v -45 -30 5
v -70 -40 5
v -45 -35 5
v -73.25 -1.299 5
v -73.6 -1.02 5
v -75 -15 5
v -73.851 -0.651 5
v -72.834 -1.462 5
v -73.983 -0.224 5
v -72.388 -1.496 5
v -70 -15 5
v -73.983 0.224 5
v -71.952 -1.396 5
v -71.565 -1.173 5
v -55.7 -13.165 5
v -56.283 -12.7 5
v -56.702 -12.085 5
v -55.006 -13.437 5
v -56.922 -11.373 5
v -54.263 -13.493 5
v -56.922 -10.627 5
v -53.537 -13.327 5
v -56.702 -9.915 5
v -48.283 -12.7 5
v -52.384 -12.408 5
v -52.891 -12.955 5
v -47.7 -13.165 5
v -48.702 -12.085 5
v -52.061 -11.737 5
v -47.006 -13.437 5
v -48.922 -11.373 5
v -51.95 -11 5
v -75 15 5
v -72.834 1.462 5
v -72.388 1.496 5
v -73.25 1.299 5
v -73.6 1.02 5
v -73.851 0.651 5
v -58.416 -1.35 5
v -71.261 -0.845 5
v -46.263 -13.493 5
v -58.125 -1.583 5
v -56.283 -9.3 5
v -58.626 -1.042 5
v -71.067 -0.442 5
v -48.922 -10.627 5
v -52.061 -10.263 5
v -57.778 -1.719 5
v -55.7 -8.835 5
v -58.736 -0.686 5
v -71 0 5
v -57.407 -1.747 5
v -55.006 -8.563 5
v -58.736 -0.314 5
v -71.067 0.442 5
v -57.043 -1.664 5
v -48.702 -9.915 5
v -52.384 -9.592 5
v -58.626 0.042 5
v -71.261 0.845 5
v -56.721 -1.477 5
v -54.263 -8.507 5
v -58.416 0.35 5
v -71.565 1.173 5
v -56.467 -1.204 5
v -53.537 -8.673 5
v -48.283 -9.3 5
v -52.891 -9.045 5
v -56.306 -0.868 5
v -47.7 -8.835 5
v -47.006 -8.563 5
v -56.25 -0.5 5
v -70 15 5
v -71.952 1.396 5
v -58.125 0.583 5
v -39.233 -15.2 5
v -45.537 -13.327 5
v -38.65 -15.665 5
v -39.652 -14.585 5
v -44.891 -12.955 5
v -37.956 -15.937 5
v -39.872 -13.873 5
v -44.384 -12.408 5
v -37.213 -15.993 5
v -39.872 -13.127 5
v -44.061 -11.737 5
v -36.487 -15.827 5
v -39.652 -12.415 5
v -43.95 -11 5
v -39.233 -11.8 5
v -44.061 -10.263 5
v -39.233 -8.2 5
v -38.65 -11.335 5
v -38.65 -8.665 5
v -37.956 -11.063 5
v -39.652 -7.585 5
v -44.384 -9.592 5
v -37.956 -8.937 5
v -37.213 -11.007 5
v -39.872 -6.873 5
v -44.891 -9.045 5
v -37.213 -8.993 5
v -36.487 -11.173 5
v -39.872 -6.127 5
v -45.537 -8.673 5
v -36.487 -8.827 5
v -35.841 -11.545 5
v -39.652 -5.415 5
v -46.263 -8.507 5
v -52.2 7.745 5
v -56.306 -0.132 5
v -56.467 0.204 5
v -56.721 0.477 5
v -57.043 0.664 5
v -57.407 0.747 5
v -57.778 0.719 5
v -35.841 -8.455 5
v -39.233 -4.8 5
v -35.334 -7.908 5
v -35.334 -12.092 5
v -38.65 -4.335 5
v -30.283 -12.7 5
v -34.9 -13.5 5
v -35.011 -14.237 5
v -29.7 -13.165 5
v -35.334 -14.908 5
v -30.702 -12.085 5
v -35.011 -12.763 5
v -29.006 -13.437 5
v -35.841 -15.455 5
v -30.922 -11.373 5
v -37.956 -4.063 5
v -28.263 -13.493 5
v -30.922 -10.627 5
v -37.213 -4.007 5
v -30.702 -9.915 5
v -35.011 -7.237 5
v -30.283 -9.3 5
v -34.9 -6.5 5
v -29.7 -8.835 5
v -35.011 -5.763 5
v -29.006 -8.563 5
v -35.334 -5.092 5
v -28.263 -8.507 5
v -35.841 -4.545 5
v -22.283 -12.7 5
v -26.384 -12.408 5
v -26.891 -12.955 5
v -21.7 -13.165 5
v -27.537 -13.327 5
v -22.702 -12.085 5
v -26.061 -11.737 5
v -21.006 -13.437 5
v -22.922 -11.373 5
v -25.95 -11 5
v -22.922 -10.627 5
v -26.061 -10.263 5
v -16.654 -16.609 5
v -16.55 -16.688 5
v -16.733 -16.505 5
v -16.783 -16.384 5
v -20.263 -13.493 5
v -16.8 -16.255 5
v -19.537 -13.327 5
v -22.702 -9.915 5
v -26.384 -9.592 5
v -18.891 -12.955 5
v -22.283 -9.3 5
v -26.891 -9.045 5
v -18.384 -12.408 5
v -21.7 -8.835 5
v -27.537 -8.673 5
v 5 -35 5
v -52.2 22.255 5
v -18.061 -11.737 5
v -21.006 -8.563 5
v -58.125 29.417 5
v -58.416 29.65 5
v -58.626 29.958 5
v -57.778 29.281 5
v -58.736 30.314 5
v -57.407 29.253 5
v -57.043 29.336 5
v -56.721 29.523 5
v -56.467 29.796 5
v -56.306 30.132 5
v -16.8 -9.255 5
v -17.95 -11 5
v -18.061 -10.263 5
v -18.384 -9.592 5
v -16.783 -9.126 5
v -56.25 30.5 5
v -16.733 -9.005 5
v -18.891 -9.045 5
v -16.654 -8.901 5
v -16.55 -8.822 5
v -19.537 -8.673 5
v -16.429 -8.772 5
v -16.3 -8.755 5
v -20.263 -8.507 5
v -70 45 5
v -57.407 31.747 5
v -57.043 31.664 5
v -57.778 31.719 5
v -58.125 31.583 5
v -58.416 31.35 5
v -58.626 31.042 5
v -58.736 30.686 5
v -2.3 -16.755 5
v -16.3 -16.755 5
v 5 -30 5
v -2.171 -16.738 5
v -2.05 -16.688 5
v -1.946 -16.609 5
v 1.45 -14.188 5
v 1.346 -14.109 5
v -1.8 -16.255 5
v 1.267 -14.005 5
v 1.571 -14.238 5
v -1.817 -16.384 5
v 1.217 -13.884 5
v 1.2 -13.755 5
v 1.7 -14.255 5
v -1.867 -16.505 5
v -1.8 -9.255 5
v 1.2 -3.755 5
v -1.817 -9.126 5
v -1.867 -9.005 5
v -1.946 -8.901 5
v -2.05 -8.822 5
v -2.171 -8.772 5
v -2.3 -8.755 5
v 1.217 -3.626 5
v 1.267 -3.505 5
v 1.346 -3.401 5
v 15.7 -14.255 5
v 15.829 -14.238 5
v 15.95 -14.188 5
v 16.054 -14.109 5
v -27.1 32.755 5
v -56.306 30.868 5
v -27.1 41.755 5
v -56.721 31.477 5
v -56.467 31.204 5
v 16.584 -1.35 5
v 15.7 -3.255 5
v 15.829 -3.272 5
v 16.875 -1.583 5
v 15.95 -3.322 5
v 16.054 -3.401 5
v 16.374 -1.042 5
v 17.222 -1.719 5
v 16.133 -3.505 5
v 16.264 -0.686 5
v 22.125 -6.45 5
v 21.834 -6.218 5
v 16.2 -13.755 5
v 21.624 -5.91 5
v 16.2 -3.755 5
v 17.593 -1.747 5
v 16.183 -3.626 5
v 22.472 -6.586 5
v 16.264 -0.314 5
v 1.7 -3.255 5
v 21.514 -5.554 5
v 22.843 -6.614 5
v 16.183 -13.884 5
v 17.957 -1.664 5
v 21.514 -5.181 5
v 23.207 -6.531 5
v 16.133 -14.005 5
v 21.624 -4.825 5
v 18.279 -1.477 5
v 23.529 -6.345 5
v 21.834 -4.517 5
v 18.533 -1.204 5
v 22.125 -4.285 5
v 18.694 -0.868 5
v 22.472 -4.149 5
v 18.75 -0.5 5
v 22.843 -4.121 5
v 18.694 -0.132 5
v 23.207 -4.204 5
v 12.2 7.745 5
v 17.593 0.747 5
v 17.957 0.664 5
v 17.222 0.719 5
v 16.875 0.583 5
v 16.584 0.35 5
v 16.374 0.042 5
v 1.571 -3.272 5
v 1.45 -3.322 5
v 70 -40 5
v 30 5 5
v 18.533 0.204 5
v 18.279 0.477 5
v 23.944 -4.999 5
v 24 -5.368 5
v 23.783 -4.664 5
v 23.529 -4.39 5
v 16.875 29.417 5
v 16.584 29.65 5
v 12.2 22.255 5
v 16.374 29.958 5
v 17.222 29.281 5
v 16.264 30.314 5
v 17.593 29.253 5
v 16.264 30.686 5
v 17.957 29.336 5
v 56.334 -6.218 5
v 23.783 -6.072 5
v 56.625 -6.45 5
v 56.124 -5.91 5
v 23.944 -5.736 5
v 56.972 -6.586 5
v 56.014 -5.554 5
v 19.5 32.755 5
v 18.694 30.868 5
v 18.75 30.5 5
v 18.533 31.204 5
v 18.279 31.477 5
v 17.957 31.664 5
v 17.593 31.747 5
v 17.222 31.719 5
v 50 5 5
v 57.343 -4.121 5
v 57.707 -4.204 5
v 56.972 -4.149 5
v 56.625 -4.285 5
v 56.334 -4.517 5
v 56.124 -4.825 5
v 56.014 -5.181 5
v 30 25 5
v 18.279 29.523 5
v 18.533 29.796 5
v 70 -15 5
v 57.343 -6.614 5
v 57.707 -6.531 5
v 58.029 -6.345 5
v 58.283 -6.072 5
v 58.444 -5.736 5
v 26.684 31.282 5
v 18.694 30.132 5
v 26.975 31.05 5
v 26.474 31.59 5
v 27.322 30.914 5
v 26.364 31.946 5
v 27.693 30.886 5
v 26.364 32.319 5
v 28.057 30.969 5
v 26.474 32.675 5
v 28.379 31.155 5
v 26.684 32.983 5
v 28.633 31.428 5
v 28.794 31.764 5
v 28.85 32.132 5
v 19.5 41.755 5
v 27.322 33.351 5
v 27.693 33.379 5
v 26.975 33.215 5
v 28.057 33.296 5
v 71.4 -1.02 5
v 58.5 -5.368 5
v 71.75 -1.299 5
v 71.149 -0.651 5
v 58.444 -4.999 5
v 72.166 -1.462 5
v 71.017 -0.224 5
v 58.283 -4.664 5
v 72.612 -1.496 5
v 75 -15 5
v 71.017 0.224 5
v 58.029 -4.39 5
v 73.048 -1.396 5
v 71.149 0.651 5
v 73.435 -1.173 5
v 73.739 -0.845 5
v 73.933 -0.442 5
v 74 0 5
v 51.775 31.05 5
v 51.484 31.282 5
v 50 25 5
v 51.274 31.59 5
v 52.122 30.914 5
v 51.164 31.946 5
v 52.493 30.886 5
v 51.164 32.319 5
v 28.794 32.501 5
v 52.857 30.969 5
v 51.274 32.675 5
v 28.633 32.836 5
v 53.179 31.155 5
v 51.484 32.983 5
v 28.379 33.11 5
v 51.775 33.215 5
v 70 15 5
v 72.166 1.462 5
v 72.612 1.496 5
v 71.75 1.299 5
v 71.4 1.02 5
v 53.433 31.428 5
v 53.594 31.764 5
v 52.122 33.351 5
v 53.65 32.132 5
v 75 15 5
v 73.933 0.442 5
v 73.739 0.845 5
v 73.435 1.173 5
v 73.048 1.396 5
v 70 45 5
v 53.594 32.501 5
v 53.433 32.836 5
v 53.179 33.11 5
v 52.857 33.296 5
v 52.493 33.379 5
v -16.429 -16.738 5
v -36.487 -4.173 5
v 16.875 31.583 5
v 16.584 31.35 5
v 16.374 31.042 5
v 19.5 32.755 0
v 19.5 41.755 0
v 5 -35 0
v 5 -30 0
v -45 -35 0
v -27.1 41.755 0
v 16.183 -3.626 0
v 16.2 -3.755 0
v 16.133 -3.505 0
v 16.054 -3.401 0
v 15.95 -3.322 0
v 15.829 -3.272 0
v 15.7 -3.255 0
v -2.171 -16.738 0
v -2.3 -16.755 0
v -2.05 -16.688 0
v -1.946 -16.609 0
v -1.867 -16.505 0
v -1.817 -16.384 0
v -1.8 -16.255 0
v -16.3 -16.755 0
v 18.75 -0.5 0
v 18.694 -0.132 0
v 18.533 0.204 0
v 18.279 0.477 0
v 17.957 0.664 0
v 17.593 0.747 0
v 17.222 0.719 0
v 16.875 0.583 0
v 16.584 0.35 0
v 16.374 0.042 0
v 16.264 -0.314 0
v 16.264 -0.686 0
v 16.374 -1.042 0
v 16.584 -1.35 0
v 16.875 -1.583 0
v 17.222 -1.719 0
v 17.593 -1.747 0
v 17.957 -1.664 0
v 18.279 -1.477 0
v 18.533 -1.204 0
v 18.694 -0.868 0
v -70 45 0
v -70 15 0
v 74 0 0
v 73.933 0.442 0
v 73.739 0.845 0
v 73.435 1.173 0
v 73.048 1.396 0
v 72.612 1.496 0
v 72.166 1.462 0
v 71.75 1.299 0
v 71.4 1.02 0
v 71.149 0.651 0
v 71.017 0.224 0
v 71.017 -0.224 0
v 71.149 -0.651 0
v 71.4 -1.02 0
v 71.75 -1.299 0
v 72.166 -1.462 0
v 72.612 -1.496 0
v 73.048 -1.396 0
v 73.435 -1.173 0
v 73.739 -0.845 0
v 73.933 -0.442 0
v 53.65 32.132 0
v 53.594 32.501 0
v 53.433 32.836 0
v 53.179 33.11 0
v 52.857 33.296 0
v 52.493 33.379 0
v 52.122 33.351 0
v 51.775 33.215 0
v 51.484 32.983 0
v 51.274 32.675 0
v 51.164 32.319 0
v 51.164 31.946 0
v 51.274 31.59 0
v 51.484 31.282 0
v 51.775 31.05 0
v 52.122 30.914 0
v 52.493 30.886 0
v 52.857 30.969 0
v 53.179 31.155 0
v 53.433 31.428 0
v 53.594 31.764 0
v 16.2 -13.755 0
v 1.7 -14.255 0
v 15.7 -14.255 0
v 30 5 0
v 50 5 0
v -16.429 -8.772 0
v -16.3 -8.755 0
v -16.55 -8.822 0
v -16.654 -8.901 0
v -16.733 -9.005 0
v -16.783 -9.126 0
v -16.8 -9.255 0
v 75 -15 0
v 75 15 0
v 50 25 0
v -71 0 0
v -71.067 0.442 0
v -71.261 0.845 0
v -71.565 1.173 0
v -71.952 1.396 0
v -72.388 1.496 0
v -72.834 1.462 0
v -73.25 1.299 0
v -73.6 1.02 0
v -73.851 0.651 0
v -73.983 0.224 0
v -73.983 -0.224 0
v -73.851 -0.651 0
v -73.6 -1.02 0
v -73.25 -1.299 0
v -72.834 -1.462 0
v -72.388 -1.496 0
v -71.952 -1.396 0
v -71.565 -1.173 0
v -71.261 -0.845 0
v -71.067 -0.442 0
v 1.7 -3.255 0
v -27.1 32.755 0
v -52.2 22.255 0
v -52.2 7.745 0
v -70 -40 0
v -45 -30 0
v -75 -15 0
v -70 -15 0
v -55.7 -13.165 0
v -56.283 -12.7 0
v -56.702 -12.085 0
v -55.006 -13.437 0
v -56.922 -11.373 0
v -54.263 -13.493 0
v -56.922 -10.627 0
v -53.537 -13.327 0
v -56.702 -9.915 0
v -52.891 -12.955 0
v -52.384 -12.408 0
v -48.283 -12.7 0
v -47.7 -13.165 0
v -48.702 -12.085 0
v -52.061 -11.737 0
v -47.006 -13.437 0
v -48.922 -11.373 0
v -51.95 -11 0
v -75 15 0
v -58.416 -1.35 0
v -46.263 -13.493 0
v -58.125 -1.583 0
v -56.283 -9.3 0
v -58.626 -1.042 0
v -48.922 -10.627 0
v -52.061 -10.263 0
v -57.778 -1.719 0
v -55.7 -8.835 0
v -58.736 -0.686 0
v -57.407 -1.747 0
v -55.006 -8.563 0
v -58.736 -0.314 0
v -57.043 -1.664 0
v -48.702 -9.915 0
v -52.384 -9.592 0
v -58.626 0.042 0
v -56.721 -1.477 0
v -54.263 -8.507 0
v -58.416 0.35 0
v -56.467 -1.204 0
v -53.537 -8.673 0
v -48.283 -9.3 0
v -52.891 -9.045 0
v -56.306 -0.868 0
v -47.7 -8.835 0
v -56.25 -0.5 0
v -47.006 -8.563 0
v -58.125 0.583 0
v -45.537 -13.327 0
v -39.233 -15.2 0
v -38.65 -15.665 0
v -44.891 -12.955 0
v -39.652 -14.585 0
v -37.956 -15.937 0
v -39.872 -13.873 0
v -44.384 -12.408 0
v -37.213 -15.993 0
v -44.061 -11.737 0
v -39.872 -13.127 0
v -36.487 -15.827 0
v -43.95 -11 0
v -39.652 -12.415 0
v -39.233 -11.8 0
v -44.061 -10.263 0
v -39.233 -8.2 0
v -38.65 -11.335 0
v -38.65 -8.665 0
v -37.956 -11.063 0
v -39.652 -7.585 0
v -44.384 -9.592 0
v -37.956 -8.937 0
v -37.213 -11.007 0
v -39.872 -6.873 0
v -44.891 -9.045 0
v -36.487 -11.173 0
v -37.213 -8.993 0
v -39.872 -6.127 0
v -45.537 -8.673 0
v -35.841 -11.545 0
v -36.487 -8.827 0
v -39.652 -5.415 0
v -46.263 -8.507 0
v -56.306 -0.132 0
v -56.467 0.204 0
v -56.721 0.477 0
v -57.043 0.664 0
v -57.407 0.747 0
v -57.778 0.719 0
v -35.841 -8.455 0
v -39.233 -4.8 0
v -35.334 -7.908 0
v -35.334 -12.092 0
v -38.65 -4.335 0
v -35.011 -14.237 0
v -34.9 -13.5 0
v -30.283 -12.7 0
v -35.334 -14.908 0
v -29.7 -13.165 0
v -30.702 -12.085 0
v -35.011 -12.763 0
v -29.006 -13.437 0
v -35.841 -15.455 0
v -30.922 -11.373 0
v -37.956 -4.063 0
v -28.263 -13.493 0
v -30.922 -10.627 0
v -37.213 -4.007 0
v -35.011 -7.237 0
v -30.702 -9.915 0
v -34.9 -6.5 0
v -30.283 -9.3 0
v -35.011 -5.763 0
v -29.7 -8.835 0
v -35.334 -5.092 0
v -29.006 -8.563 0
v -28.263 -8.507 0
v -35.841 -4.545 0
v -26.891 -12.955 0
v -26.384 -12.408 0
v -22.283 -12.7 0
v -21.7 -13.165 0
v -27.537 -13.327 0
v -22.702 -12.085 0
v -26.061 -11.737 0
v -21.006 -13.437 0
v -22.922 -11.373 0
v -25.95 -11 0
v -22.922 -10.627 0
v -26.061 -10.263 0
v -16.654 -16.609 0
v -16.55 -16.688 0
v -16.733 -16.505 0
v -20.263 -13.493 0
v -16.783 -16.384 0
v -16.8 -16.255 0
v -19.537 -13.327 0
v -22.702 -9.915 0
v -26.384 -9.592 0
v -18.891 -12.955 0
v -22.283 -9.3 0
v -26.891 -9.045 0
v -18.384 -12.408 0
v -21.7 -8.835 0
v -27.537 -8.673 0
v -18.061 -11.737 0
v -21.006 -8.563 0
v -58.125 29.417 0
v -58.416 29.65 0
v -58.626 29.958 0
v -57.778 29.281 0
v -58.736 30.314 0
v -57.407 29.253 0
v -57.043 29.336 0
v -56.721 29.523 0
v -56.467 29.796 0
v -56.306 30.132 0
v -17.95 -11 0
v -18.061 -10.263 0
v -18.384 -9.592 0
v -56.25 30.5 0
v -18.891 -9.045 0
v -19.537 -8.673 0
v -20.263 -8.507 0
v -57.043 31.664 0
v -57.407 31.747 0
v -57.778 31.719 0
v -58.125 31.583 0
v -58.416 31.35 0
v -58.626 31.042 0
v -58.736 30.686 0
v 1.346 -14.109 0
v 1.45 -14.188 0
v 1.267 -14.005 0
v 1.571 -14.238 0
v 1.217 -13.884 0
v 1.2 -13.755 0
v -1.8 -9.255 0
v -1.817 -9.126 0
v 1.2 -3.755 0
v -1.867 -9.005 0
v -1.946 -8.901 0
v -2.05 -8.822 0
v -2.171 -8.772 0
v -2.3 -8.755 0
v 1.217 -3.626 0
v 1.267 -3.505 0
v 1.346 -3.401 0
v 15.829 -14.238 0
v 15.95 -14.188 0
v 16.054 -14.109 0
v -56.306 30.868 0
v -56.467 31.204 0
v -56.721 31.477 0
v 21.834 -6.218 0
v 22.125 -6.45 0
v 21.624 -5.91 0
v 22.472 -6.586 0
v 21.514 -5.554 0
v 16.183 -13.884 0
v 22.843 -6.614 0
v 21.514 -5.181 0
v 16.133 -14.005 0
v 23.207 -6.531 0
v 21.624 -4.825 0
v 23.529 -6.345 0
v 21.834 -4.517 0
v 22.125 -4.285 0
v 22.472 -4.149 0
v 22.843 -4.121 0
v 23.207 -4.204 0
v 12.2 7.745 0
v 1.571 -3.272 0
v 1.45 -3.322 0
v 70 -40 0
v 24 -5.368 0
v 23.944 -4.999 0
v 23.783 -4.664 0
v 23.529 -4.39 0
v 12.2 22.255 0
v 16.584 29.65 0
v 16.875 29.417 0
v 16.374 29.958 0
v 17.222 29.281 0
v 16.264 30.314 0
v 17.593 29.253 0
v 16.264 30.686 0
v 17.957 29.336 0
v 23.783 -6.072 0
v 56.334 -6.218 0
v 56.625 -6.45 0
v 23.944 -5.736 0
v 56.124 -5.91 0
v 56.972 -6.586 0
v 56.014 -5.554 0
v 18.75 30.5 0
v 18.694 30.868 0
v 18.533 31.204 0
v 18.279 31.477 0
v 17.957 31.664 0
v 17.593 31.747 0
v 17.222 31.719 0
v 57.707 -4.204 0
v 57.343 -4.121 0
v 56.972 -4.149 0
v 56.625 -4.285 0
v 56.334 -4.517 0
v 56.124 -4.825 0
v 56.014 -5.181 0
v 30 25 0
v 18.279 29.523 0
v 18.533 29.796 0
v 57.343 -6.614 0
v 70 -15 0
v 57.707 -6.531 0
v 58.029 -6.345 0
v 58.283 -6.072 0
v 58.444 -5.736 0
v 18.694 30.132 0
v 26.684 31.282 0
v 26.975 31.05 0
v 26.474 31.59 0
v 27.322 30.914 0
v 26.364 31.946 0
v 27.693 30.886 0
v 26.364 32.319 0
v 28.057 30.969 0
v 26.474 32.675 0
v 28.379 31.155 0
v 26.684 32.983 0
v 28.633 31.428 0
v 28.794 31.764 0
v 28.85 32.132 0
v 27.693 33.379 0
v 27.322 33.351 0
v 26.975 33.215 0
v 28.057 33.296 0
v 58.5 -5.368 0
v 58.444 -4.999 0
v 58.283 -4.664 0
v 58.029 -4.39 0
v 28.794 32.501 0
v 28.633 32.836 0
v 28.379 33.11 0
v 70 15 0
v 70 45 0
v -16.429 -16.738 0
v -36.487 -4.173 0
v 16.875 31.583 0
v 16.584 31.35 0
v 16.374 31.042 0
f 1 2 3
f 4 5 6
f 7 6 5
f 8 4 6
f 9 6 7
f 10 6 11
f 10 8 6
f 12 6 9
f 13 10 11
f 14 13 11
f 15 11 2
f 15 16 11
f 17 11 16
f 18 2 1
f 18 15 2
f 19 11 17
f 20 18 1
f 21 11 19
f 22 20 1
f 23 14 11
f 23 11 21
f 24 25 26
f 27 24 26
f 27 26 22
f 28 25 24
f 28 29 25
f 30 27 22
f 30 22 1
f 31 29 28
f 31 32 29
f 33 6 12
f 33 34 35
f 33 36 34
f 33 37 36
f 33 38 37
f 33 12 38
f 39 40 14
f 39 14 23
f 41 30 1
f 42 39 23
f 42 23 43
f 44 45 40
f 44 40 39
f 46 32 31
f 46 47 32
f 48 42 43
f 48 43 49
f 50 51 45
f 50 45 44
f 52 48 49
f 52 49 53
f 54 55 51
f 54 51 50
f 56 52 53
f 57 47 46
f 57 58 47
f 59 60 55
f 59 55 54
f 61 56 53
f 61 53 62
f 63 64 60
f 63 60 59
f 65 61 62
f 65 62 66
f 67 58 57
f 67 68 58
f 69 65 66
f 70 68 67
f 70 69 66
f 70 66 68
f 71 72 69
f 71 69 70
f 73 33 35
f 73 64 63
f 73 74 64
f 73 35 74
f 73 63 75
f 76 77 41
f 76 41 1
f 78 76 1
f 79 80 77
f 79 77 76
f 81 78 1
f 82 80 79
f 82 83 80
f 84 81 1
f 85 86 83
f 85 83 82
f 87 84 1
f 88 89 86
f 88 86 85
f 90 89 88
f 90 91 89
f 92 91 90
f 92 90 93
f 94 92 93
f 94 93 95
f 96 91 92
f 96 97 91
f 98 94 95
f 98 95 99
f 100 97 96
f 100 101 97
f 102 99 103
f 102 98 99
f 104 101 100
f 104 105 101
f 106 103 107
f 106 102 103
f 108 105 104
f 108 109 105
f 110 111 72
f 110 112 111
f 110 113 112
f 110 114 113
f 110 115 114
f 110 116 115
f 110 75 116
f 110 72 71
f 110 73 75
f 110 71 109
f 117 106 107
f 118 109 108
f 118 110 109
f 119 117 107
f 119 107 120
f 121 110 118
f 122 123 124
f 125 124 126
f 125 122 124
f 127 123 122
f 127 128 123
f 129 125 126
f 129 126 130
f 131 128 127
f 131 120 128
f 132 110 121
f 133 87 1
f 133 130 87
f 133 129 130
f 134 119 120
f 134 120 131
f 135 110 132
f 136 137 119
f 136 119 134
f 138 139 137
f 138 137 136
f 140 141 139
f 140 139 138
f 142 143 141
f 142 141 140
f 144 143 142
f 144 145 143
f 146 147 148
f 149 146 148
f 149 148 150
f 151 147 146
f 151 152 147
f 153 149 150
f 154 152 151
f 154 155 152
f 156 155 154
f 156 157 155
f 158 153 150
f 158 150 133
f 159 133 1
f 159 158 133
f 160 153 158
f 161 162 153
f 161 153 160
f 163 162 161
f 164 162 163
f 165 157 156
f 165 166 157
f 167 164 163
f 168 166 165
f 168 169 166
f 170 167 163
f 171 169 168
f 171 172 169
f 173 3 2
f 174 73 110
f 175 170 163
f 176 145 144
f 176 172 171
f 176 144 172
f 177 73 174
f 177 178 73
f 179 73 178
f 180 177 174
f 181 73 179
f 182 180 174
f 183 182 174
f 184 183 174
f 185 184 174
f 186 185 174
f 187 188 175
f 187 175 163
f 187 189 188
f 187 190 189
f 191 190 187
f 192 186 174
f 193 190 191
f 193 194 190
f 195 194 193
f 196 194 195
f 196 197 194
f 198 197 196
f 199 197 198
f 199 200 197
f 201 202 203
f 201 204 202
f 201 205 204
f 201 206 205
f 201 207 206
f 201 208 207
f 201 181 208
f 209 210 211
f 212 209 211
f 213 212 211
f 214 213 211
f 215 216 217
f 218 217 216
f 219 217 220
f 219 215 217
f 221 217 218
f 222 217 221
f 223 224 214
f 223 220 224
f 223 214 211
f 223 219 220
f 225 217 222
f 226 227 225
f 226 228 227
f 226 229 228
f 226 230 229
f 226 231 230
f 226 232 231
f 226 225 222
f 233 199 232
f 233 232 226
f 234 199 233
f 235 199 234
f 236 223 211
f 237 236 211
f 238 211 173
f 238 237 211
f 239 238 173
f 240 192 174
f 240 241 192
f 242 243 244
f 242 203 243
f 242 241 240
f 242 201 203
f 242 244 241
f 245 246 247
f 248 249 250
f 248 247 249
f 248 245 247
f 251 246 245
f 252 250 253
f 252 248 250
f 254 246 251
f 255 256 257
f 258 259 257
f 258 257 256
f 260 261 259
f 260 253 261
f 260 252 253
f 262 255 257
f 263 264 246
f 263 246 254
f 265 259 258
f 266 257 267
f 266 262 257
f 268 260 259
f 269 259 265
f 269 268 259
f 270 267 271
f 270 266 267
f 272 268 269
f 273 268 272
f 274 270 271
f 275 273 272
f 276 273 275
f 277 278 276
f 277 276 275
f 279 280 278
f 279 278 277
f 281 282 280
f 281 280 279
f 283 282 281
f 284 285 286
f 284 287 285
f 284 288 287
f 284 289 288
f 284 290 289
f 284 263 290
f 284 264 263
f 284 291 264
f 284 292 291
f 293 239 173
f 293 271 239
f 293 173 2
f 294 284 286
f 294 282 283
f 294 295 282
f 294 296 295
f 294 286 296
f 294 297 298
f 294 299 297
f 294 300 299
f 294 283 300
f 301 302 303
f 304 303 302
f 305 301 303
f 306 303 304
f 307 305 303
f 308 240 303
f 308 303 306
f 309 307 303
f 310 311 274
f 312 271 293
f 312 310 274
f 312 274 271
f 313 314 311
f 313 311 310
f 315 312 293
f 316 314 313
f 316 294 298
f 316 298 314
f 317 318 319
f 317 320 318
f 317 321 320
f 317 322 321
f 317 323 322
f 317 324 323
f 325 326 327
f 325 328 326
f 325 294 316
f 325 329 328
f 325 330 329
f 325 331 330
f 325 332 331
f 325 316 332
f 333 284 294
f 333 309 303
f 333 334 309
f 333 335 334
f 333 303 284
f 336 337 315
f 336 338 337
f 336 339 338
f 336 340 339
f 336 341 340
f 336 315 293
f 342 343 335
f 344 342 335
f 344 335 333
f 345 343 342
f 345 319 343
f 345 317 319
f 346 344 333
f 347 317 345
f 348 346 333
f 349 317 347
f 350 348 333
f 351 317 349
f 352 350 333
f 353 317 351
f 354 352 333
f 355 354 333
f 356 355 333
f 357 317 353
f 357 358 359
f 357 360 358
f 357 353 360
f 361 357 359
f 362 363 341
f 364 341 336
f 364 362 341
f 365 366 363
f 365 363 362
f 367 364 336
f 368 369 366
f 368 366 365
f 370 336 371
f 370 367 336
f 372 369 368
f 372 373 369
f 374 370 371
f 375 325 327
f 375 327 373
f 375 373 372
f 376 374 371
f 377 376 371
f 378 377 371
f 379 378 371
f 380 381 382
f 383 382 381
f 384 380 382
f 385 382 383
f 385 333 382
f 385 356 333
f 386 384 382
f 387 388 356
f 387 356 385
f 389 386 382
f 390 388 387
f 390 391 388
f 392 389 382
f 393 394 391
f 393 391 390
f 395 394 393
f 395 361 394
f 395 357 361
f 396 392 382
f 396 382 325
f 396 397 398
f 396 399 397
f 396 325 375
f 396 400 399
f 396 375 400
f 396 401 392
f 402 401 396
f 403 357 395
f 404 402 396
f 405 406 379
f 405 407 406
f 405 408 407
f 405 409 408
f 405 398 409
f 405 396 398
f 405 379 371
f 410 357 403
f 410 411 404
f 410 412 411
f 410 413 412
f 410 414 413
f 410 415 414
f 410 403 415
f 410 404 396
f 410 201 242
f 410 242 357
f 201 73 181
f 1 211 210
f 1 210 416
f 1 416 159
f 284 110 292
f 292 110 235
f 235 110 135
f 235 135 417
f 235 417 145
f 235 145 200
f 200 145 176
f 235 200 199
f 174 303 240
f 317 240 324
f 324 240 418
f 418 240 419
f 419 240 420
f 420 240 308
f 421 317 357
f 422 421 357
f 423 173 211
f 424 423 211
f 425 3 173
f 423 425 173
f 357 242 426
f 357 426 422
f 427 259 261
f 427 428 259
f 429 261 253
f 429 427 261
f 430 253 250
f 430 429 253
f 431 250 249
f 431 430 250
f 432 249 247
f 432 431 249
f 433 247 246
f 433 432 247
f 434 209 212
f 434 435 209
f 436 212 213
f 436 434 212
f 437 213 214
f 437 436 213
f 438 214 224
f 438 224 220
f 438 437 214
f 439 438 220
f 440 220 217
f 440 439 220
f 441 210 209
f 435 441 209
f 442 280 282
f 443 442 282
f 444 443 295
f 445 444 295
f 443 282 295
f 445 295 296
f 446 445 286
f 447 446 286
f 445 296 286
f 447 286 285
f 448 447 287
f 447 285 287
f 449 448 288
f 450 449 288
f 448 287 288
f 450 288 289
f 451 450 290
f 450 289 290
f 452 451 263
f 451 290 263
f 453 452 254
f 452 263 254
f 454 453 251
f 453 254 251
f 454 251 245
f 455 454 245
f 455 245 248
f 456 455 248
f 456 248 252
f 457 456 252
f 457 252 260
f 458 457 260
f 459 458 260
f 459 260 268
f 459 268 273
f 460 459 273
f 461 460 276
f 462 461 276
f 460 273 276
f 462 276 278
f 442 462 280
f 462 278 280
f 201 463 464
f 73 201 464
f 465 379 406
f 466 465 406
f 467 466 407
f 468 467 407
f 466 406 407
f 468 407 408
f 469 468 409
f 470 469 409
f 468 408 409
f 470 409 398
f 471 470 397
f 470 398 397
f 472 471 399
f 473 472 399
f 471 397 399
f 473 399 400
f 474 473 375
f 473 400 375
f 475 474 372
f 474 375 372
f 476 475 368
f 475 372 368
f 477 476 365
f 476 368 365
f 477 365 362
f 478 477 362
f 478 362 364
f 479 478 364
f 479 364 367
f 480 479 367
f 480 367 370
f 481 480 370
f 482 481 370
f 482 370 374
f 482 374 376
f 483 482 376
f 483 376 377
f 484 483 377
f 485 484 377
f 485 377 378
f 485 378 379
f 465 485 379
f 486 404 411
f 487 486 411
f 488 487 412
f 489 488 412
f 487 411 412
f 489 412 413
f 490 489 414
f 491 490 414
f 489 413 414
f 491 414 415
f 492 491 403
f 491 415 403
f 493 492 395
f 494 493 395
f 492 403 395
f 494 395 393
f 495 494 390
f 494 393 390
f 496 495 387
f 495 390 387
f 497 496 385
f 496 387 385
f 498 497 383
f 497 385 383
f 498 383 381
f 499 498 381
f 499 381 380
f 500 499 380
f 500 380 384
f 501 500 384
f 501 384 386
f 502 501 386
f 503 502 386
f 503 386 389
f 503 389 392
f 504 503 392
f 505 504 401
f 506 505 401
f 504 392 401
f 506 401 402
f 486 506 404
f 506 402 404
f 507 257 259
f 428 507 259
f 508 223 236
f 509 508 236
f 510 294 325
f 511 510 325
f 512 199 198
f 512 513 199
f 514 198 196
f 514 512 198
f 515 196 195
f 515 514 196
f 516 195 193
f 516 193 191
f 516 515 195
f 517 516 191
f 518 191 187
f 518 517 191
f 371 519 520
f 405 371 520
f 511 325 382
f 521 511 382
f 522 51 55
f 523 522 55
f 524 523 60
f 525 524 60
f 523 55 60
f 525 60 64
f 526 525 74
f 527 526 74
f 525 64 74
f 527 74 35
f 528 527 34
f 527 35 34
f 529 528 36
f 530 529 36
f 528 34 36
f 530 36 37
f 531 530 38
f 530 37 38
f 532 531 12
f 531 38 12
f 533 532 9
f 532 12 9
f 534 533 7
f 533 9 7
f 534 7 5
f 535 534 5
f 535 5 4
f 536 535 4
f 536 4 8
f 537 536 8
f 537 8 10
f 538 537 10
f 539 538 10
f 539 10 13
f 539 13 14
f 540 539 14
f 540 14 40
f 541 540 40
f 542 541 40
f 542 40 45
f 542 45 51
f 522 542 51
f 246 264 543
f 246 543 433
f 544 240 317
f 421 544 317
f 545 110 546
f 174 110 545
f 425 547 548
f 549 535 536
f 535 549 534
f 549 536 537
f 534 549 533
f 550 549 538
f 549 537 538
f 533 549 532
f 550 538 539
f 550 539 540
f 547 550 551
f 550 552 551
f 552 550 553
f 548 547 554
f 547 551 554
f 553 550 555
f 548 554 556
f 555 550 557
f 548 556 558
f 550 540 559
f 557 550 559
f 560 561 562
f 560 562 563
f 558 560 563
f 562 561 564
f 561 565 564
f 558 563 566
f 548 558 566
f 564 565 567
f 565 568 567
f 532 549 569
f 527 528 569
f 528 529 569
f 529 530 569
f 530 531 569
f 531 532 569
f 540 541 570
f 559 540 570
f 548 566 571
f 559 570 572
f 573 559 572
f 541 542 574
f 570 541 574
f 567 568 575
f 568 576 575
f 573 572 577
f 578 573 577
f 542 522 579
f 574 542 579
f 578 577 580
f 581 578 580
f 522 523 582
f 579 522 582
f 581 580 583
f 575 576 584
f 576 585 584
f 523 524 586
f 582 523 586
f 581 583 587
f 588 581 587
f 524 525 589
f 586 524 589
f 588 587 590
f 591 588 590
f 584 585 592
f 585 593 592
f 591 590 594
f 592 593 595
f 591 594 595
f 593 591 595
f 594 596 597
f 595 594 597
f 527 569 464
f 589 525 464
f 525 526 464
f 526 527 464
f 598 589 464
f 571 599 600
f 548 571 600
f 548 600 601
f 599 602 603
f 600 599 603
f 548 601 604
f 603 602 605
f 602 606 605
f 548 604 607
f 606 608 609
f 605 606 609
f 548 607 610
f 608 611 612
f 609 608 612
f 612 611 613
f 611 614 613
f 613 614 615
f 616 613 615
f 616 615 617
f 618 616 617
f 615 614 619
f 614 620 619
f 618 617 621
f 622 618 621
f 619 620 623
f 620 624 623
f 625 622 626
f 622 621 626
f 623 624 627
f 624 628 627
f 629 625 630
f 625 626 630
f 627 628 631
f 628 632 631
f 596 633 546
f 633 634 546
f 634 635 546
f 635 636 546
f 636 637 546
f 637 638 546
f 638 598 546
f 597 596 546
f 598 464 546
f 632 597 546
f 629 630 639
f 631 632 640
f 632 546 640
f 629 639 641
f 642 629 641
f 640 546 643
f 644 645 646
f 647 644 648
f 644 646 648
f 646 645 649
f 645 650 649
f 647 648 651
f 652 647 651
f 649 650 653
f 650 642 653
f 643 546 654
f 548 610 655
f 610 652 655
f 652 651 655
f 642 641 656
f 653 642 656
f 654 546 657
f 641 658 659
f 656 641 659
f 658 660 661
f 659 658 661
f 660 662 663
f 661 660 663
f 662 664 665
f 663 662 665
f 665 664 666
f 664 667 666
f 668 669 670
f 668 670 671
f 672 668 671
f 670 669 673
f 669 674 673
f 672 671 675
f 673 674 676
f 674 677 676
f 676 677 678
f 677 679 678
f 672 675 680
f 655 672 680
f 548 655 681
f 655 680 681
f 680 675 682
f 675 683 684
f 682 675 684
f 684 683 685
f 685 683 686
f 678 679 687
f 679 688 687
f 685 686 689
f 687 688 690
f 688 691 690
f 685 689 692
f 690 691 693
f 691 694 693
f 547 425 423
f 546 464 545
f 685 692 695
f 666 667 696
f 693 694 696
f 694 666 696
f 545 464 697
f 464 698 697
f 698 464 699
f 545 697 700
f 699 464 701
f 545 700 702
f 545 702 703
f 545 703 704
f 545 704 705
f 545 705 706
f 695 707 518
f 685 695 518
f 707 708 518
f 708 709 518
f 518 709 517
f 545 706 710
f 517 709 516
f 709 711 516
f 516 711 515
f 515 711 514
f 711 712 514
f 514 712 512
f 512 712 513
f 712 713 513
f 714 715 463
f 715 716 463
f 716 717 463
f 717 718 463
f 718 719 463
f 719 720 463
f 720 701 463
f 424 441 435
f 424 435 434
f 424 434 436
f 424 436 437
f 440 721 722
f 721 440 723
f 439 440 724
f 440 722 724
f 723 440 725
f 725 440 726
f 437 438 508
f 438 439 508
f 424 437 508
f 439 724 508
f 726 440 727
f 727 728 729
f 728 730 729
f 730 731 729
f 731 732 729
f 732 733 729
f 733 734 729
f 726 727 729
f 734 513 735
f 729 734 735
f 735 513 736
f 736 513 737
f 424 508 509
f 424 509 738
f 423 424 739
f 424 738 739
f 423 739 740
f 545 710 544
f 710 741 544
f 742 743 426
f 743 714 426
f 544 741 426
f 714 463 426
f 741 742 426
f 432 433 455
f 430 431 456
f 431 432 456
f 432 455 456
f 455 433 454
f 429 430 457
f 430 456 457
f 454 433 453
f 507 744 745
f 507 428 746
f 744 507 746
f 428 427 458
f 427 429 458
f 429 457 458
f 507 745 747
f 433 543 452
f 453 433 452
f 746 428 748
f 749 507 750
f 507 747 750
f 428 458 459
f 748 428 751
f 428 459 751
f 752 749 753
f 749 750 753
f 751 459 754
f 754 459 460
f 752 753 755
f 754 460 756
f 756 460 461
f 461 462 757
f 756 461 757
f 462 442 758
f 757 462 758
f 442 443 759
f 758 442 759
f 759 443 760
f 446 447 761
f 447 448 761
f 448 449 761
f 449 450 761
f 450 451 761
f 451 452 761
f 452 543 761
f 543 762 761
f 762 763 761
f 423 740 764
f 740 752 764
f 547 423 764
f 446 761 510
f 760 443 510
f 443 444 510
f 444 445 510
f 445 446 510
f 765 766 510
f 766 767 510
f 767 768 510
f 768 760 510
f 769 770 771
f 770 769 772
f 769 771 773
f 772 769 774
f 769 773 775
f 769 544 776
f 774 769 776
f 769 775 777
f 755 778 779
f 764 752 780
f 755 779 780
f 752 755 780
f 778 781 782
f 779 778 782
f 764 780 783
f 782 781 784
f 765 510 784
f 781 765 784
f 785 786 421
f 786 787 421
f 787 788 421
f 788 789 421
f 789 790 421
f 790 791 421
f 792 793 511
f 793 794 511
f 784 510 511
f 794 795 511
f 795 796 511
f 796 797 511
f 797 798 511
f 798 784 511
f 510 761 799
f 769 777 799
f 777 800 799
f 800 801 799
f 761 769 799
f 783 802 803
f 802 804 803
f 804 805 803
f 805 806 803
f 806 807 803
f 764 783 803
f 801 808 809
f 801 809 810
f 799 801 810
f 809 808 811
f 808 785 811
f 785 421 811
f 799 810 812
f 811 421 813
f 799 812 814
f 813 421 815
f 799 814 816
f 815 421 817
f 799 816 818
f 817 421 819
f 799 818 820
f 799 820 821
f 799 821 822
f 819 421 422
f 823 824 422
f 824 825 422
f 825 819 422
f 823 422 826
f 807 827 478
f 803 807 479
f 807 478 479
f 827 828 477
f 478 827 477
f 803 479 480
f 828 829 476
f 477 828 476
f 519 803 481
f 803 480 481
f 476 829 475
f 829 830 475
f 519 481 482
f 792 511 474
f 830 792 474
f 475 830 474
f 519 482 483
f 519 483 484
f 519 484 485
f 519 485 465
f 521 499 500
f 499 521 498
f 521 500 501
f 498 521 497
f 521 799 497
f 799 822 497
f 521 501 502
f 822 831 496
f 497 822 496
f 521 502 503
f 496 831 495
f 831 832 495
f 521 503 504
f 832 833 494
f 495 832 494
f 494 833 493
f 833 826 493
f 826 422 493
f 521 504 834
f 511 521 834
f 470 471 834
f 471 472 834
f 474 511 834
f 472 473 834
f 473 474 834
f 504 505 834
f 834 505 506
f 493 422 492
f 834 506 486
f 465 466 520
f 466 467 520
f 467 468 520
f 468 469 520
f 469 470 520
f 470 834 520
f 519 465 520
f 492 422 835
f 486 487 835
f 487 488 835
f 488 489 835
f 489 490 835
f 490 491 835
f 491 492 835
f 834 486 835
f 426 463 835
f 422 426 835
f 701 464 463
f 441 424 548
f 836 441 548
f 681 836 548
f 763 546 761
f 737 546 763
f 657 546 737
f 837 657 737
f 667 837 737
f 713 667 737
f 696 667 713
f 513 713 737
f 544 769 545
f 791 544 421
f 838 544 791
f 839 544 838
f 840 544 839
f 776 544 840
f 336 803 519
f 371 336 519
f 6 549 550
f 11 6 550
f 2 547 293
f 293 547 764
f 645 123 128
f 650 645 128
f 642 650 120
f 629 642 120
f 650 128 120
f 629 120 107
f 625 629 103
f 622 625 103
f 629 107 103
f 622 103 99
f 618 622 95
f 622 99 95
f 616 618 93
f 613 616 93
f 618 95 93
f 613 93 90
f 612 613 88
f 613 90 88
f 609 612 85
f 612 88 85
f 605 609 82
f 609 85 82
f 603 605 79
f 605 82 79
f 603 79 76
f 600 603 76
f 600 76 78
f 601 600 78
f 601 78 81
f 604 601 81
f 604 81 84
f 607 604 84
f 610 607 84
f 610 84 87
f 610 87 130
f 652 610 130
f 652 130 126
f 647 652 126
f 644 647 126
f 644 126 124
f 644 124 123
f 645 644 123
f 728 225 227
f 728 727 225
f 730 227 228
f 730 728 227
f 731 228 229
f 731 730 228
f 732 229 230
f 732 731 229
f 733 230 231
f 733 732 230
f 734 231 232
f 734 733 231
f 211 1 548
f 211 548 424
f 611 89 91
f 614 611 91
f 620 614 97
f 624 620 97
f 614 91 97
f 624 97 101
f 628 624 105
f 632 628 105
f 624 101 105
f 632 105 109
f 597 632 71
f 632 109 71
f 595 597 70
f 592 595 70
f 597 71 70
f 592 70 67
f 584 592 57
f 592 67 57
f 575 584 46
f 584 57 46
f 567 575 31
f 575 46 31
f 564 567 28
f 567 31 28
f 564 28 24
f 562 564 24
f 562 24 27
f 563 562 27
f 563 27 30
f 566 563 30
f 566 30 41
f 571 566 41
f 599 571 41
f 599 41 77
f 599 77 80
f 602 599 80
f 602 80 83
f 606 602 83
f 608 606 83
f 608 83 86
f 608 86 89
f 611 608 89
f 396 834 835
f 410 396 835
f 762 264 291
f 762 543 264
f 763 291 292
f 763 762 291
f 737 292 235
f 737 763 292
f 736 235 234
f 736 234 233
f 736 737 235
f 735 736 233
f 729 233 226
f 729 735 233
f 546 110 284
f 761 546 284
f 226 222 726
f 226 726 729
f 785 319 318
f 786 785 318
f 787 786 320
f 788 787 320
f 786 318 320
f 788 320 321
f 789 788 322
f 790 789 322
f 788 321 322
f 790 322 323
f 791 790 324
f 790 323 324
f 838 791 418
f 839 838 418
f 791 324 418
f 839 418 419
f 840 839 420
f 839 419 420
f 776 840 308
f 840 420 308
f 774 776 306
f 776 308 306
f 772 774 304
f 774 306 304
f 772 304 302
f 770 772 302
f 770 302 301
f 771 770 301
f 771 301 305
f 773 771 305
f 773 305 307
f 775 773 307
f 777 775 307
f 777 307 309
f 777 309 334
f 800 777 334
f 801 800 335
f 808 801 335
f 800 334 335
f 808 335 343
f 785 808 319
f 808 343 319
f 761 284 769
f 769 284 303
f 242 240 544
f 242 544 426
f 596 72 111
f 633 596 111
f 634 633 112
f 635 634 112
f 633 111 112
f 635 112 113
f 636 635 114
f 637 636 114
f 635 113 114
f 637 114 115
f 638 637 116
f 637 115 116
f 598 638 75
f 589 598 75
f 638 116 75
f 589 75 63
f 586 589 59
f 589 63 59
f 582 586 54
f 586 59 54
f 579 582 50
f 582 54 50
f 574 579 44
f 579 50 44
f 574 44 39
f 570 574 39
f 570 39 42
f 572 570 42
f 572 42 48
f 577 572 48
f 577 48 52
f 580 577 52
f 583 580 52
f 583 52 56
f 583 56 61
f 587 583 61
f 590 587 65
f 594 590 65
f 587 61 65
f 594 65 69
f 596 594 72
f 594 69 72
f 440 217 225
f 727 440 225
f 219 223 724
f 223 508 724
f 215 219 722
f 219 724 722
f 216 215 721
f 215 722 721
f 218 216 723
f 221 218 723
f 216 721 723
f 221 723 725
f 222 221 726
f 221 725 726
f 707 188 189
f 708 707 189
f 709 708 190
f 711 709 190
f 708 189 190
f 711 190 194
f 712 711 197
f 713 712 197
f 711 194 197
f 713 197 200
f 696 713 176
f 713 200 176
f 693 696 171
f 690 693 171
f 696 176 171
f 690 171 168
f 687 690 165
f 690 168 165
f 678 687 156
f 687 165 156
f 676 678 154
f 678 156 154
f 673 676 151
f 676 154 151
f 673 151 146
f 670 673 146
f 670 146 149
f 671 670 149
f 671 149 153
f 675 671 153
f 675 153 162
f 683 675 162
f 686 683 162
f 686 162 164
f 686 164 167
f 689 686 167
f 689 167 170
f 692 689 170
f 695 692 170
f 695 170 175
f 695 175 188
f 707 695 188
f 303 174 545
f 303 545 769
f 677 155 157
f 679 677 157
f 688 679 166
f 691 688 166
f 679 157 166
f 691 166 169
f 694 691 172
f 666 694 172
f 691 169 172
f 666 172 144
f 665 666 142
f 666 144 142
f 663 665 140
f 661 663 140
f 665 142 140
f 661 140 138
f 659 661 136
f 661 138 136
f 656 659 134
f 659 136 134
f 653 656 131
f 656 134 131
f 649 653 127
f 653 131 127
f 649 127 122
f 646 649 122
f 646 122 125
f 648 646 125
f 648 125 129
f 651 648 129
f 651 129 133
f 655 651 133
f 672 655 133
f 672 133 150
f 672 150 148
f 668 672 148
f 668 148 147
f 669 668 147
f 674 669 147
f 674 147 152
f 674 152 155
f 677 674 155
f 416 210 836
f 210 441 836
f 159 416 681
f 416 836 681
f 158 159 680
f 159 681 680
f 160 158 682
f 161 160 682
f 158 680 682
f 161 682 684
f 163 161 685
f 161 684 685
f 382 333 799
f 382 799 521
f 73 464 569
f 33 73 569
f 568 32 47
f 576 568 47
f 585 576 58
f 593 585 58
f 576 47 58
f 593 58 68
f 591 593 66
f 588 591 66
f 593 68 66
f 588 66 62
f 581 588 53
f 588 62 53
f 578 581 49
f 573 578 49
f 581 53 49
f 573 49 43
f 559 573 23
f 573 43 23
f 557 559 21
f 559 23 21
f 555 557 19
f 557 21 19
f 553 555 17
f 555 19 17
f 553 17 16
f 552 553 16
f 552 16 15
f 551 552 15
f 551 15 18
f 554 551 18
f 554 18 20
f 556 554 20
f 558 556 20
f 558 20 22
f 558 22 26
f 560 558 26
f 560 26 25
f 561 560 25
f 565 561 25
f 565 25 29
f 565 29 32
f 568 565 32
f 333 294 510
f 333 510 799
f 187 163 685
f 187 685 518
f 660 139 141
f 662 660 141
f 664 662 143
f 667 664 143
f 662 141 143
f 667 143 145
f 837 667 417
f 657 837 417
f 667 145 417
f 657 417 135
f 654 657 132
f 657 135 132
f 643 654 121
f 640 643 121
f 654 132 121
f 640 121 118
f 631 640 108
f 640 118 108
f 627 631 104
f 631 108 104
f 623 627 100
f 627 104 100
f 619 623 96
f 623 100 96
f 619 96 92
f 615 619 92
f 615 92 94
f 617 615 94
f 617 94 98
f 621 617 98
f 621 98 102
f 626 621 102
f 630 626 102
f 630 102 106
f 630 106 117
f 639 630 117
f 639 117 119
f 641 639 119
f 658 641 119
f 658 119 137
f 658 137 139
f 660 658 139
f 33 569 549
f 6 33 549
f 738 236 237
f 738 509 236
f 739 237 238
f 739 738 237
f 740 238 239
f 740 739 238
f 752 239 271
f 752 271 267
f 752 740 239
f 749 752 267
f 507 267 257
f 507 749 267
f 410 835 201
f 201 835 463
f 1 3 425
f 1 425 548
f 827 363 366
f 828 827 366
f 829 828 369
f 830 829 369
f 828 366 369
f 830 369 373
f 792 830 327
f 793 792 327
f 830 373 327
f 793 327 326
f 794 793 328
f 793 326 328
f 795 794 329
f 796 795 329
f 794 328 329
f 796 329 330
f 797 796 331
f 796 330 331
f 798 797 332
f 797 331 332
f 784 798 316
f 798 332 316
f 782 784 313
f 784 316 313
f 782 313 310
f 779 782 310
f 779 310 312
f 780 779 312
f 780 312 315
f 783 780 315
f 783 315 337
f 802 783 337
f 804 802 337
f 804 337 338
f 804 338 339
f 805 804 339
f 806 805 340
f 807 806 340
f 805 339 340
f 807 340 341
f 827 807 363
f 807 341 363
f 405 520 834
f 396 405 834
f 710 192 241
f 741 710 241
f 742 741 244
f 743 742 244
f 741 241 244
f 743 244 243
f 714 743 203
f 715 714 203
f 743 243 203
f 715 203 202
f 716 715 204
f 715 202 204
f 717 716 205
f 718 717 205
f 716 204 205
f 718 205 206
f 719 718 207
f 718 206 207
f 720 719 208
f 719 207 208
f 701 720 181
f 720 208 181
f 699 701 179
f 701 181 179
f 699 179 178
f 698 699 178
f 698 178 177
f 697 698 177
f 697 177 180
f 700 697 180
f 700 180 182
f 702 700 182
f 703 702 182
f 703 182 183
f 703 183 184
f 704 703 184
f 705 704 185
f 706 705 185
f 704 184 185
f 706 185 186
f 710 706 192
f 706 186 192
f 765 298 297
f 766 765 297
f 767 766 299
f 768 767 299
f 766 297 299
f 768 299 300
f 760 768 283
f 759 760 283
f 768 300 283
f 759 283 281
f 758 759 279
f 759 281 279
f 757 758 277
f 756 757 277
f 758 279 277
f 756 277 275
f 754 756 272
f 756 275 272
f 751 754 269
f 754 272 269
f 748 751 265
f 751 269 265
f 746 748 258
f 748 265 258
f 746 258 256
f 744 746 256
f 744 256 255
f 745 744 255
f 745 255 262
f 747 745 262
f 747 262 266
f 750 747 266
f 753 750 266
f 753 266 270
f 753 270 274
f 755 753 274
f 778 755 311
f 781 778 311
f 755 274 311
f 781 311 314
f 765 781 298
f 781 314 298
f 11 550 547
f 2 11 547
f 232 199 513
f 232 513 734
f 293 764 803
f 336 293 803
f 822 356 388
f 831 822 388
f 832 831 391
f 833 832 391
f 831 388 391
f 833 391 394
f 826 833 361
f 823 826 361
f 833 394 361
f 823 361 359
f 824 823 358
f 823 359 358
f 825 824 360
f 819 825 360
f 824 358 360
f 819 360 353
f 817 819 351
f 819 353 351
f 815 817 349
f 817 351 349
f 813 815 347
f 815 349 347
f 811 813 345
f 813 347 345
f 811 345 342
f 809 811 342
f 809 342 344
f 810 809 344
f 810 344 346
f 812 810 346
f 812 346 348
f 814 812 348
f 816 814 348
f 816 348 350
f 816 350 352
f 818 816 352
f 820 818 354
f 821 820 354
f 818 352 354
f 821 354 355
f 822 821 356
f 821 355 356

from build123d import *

# Parameters (mm, degrees)
BOSS_EXTRUDE1_DEPTH = 5
SKETCH2_R           = 1.25
SKETCH2_W           = 64.4
SKETCH2_H           = 14.51
SKETCH2_W_2         = 20
SKETCH2_H_2         = 20
CUT_EXTRUDE1_DEPTH  = 5
SKETCH3_R           = 2.5
SKETCH3_R_2         = 1.5
SKETCH3_W           = 46.6
SKETCH3_H           = 9
SKETCH3_W_2         = 15
SKETCH3_H_2         = 8
SKETCH3_H_3         = 11
SKETCH3_W_3         = 50
SKETCH3_H_4         = 5
CUT_EXTRUDE2_DEPTH  = 10
FILLET1_R           = 0.5


with BuildPart() as part:
    # Sketch1 → Boss-Extrude1 (new body)
    with BuildSketch(Plane.XY):
        Polygon((-75, -15), (-70, -15), (-70, -40), (70, -40), (70, -15), (75, -15), (75, 15), (70, 15), (70, 45), (-70, 45), (-70, 15), (-75, 15), align=None)
    extrude(amount=BOSS_EXTRUDE1_DEPTH)

    # Sketch2 → Cut-Extrude1 (cut)
    with BuildSketch(Plane.XY.offset(5)):
        with Locations((-57.5, 30.5)):
            Circle(SKETCH2_R)
        with Locations((17.5, 30.5)):
            Circle(SKETCH2_R)
        with Locations((17.5, -0.5)):
            Circle(SKETCH2_R)
        with Locations((-57.5, -0.5)):
            Circle(SKETCH2_R)
        with Locations((27.6, 32.132337083)):
            Circle(SKETCH2_R)
        with Locations((52.4, 32.132337083)):
            Circle(SKETCH2_R)
        with Locations((22.75, -5.367662917)):
            Circle(SKETCH2_R)
        with Locations((57.25, -5.367662917)):
            Circle(SKETCH2_R)
        with Locations((-20, 15)):
            Rectangle(SKETCH2_W, SKETCH2_H)
        with Locations((40, 15)):
            Rectangle(SKETCH2_W_2, SKETCH2_H_2)
    extrude(amount=-CUT_EXTRUDE1_DEPTH, mode=Mode.SUBTRACT)

    # Sketch3 → Cut-Extrude2 (cut)
    with BuildSketch(Plane.XY.offset(5)):
        with Locations((-54.45, -11)):
            Circle(SKETCH3_R)
        with Locations((-46.45, -11)):
            Circle(SKETCH3_R)
        with Locations((-37.4, -6.5)):
            Circle(SKETCH3_R)
        with Locations((-28.45, -11)):
            Circle(SKETCH3_R)
        with Locations((-20.45, -11)):
            Circle(SKETCH3_R)
        with Locations((72.5, 0)):
            Circle(SKETCH3_R_2)
        with Locations((-72.5, 0)):
            Circle(SKETCH3_R_2)
        with Locations((-37.4, -13.5)):
            Circle(SKETCH3_R)
        with Locations((-3.8, 37.255)):
            Rectangle(SKETCH3_W, SKETCH3_H)
        with Locations((-9.3, -12.755)):
            Rectangle(SKETCH3_W_2, SKETCH3_H_2)
        with Locations((8.7, -8.755)):
            Rectangle(SKETCH3_W_2, SKETCH3_H_3)
        with Locations((-20, -32.5)):
            Rectangle(SKETCH3_W_3, SKETCH3_H_4)
    extrude(amount=-CUT_EXTRUDE2_DEPTH, mode=Mode.SUBTRACT)

    # Fillet1
    fillet1_edges = [part.edges().sort_by_distance(p)[0] for p in [
        (16.2, -3.255, 2.5),
        (16.2, -14.255, 2.5),
        (1.2, -14.255, 2.5),
        (1.2, -3.255, 2.5),
        (-1.8, -8.755, 2.5),
        (-1.8, -16.755, 2.5),
        (-16.8, -16.755, 2.5),
        (-16.8, -8.755, 2.5),
    ]]
    fillet(fillet1_edges, radius=FILLET1_R)


solid = part.part
